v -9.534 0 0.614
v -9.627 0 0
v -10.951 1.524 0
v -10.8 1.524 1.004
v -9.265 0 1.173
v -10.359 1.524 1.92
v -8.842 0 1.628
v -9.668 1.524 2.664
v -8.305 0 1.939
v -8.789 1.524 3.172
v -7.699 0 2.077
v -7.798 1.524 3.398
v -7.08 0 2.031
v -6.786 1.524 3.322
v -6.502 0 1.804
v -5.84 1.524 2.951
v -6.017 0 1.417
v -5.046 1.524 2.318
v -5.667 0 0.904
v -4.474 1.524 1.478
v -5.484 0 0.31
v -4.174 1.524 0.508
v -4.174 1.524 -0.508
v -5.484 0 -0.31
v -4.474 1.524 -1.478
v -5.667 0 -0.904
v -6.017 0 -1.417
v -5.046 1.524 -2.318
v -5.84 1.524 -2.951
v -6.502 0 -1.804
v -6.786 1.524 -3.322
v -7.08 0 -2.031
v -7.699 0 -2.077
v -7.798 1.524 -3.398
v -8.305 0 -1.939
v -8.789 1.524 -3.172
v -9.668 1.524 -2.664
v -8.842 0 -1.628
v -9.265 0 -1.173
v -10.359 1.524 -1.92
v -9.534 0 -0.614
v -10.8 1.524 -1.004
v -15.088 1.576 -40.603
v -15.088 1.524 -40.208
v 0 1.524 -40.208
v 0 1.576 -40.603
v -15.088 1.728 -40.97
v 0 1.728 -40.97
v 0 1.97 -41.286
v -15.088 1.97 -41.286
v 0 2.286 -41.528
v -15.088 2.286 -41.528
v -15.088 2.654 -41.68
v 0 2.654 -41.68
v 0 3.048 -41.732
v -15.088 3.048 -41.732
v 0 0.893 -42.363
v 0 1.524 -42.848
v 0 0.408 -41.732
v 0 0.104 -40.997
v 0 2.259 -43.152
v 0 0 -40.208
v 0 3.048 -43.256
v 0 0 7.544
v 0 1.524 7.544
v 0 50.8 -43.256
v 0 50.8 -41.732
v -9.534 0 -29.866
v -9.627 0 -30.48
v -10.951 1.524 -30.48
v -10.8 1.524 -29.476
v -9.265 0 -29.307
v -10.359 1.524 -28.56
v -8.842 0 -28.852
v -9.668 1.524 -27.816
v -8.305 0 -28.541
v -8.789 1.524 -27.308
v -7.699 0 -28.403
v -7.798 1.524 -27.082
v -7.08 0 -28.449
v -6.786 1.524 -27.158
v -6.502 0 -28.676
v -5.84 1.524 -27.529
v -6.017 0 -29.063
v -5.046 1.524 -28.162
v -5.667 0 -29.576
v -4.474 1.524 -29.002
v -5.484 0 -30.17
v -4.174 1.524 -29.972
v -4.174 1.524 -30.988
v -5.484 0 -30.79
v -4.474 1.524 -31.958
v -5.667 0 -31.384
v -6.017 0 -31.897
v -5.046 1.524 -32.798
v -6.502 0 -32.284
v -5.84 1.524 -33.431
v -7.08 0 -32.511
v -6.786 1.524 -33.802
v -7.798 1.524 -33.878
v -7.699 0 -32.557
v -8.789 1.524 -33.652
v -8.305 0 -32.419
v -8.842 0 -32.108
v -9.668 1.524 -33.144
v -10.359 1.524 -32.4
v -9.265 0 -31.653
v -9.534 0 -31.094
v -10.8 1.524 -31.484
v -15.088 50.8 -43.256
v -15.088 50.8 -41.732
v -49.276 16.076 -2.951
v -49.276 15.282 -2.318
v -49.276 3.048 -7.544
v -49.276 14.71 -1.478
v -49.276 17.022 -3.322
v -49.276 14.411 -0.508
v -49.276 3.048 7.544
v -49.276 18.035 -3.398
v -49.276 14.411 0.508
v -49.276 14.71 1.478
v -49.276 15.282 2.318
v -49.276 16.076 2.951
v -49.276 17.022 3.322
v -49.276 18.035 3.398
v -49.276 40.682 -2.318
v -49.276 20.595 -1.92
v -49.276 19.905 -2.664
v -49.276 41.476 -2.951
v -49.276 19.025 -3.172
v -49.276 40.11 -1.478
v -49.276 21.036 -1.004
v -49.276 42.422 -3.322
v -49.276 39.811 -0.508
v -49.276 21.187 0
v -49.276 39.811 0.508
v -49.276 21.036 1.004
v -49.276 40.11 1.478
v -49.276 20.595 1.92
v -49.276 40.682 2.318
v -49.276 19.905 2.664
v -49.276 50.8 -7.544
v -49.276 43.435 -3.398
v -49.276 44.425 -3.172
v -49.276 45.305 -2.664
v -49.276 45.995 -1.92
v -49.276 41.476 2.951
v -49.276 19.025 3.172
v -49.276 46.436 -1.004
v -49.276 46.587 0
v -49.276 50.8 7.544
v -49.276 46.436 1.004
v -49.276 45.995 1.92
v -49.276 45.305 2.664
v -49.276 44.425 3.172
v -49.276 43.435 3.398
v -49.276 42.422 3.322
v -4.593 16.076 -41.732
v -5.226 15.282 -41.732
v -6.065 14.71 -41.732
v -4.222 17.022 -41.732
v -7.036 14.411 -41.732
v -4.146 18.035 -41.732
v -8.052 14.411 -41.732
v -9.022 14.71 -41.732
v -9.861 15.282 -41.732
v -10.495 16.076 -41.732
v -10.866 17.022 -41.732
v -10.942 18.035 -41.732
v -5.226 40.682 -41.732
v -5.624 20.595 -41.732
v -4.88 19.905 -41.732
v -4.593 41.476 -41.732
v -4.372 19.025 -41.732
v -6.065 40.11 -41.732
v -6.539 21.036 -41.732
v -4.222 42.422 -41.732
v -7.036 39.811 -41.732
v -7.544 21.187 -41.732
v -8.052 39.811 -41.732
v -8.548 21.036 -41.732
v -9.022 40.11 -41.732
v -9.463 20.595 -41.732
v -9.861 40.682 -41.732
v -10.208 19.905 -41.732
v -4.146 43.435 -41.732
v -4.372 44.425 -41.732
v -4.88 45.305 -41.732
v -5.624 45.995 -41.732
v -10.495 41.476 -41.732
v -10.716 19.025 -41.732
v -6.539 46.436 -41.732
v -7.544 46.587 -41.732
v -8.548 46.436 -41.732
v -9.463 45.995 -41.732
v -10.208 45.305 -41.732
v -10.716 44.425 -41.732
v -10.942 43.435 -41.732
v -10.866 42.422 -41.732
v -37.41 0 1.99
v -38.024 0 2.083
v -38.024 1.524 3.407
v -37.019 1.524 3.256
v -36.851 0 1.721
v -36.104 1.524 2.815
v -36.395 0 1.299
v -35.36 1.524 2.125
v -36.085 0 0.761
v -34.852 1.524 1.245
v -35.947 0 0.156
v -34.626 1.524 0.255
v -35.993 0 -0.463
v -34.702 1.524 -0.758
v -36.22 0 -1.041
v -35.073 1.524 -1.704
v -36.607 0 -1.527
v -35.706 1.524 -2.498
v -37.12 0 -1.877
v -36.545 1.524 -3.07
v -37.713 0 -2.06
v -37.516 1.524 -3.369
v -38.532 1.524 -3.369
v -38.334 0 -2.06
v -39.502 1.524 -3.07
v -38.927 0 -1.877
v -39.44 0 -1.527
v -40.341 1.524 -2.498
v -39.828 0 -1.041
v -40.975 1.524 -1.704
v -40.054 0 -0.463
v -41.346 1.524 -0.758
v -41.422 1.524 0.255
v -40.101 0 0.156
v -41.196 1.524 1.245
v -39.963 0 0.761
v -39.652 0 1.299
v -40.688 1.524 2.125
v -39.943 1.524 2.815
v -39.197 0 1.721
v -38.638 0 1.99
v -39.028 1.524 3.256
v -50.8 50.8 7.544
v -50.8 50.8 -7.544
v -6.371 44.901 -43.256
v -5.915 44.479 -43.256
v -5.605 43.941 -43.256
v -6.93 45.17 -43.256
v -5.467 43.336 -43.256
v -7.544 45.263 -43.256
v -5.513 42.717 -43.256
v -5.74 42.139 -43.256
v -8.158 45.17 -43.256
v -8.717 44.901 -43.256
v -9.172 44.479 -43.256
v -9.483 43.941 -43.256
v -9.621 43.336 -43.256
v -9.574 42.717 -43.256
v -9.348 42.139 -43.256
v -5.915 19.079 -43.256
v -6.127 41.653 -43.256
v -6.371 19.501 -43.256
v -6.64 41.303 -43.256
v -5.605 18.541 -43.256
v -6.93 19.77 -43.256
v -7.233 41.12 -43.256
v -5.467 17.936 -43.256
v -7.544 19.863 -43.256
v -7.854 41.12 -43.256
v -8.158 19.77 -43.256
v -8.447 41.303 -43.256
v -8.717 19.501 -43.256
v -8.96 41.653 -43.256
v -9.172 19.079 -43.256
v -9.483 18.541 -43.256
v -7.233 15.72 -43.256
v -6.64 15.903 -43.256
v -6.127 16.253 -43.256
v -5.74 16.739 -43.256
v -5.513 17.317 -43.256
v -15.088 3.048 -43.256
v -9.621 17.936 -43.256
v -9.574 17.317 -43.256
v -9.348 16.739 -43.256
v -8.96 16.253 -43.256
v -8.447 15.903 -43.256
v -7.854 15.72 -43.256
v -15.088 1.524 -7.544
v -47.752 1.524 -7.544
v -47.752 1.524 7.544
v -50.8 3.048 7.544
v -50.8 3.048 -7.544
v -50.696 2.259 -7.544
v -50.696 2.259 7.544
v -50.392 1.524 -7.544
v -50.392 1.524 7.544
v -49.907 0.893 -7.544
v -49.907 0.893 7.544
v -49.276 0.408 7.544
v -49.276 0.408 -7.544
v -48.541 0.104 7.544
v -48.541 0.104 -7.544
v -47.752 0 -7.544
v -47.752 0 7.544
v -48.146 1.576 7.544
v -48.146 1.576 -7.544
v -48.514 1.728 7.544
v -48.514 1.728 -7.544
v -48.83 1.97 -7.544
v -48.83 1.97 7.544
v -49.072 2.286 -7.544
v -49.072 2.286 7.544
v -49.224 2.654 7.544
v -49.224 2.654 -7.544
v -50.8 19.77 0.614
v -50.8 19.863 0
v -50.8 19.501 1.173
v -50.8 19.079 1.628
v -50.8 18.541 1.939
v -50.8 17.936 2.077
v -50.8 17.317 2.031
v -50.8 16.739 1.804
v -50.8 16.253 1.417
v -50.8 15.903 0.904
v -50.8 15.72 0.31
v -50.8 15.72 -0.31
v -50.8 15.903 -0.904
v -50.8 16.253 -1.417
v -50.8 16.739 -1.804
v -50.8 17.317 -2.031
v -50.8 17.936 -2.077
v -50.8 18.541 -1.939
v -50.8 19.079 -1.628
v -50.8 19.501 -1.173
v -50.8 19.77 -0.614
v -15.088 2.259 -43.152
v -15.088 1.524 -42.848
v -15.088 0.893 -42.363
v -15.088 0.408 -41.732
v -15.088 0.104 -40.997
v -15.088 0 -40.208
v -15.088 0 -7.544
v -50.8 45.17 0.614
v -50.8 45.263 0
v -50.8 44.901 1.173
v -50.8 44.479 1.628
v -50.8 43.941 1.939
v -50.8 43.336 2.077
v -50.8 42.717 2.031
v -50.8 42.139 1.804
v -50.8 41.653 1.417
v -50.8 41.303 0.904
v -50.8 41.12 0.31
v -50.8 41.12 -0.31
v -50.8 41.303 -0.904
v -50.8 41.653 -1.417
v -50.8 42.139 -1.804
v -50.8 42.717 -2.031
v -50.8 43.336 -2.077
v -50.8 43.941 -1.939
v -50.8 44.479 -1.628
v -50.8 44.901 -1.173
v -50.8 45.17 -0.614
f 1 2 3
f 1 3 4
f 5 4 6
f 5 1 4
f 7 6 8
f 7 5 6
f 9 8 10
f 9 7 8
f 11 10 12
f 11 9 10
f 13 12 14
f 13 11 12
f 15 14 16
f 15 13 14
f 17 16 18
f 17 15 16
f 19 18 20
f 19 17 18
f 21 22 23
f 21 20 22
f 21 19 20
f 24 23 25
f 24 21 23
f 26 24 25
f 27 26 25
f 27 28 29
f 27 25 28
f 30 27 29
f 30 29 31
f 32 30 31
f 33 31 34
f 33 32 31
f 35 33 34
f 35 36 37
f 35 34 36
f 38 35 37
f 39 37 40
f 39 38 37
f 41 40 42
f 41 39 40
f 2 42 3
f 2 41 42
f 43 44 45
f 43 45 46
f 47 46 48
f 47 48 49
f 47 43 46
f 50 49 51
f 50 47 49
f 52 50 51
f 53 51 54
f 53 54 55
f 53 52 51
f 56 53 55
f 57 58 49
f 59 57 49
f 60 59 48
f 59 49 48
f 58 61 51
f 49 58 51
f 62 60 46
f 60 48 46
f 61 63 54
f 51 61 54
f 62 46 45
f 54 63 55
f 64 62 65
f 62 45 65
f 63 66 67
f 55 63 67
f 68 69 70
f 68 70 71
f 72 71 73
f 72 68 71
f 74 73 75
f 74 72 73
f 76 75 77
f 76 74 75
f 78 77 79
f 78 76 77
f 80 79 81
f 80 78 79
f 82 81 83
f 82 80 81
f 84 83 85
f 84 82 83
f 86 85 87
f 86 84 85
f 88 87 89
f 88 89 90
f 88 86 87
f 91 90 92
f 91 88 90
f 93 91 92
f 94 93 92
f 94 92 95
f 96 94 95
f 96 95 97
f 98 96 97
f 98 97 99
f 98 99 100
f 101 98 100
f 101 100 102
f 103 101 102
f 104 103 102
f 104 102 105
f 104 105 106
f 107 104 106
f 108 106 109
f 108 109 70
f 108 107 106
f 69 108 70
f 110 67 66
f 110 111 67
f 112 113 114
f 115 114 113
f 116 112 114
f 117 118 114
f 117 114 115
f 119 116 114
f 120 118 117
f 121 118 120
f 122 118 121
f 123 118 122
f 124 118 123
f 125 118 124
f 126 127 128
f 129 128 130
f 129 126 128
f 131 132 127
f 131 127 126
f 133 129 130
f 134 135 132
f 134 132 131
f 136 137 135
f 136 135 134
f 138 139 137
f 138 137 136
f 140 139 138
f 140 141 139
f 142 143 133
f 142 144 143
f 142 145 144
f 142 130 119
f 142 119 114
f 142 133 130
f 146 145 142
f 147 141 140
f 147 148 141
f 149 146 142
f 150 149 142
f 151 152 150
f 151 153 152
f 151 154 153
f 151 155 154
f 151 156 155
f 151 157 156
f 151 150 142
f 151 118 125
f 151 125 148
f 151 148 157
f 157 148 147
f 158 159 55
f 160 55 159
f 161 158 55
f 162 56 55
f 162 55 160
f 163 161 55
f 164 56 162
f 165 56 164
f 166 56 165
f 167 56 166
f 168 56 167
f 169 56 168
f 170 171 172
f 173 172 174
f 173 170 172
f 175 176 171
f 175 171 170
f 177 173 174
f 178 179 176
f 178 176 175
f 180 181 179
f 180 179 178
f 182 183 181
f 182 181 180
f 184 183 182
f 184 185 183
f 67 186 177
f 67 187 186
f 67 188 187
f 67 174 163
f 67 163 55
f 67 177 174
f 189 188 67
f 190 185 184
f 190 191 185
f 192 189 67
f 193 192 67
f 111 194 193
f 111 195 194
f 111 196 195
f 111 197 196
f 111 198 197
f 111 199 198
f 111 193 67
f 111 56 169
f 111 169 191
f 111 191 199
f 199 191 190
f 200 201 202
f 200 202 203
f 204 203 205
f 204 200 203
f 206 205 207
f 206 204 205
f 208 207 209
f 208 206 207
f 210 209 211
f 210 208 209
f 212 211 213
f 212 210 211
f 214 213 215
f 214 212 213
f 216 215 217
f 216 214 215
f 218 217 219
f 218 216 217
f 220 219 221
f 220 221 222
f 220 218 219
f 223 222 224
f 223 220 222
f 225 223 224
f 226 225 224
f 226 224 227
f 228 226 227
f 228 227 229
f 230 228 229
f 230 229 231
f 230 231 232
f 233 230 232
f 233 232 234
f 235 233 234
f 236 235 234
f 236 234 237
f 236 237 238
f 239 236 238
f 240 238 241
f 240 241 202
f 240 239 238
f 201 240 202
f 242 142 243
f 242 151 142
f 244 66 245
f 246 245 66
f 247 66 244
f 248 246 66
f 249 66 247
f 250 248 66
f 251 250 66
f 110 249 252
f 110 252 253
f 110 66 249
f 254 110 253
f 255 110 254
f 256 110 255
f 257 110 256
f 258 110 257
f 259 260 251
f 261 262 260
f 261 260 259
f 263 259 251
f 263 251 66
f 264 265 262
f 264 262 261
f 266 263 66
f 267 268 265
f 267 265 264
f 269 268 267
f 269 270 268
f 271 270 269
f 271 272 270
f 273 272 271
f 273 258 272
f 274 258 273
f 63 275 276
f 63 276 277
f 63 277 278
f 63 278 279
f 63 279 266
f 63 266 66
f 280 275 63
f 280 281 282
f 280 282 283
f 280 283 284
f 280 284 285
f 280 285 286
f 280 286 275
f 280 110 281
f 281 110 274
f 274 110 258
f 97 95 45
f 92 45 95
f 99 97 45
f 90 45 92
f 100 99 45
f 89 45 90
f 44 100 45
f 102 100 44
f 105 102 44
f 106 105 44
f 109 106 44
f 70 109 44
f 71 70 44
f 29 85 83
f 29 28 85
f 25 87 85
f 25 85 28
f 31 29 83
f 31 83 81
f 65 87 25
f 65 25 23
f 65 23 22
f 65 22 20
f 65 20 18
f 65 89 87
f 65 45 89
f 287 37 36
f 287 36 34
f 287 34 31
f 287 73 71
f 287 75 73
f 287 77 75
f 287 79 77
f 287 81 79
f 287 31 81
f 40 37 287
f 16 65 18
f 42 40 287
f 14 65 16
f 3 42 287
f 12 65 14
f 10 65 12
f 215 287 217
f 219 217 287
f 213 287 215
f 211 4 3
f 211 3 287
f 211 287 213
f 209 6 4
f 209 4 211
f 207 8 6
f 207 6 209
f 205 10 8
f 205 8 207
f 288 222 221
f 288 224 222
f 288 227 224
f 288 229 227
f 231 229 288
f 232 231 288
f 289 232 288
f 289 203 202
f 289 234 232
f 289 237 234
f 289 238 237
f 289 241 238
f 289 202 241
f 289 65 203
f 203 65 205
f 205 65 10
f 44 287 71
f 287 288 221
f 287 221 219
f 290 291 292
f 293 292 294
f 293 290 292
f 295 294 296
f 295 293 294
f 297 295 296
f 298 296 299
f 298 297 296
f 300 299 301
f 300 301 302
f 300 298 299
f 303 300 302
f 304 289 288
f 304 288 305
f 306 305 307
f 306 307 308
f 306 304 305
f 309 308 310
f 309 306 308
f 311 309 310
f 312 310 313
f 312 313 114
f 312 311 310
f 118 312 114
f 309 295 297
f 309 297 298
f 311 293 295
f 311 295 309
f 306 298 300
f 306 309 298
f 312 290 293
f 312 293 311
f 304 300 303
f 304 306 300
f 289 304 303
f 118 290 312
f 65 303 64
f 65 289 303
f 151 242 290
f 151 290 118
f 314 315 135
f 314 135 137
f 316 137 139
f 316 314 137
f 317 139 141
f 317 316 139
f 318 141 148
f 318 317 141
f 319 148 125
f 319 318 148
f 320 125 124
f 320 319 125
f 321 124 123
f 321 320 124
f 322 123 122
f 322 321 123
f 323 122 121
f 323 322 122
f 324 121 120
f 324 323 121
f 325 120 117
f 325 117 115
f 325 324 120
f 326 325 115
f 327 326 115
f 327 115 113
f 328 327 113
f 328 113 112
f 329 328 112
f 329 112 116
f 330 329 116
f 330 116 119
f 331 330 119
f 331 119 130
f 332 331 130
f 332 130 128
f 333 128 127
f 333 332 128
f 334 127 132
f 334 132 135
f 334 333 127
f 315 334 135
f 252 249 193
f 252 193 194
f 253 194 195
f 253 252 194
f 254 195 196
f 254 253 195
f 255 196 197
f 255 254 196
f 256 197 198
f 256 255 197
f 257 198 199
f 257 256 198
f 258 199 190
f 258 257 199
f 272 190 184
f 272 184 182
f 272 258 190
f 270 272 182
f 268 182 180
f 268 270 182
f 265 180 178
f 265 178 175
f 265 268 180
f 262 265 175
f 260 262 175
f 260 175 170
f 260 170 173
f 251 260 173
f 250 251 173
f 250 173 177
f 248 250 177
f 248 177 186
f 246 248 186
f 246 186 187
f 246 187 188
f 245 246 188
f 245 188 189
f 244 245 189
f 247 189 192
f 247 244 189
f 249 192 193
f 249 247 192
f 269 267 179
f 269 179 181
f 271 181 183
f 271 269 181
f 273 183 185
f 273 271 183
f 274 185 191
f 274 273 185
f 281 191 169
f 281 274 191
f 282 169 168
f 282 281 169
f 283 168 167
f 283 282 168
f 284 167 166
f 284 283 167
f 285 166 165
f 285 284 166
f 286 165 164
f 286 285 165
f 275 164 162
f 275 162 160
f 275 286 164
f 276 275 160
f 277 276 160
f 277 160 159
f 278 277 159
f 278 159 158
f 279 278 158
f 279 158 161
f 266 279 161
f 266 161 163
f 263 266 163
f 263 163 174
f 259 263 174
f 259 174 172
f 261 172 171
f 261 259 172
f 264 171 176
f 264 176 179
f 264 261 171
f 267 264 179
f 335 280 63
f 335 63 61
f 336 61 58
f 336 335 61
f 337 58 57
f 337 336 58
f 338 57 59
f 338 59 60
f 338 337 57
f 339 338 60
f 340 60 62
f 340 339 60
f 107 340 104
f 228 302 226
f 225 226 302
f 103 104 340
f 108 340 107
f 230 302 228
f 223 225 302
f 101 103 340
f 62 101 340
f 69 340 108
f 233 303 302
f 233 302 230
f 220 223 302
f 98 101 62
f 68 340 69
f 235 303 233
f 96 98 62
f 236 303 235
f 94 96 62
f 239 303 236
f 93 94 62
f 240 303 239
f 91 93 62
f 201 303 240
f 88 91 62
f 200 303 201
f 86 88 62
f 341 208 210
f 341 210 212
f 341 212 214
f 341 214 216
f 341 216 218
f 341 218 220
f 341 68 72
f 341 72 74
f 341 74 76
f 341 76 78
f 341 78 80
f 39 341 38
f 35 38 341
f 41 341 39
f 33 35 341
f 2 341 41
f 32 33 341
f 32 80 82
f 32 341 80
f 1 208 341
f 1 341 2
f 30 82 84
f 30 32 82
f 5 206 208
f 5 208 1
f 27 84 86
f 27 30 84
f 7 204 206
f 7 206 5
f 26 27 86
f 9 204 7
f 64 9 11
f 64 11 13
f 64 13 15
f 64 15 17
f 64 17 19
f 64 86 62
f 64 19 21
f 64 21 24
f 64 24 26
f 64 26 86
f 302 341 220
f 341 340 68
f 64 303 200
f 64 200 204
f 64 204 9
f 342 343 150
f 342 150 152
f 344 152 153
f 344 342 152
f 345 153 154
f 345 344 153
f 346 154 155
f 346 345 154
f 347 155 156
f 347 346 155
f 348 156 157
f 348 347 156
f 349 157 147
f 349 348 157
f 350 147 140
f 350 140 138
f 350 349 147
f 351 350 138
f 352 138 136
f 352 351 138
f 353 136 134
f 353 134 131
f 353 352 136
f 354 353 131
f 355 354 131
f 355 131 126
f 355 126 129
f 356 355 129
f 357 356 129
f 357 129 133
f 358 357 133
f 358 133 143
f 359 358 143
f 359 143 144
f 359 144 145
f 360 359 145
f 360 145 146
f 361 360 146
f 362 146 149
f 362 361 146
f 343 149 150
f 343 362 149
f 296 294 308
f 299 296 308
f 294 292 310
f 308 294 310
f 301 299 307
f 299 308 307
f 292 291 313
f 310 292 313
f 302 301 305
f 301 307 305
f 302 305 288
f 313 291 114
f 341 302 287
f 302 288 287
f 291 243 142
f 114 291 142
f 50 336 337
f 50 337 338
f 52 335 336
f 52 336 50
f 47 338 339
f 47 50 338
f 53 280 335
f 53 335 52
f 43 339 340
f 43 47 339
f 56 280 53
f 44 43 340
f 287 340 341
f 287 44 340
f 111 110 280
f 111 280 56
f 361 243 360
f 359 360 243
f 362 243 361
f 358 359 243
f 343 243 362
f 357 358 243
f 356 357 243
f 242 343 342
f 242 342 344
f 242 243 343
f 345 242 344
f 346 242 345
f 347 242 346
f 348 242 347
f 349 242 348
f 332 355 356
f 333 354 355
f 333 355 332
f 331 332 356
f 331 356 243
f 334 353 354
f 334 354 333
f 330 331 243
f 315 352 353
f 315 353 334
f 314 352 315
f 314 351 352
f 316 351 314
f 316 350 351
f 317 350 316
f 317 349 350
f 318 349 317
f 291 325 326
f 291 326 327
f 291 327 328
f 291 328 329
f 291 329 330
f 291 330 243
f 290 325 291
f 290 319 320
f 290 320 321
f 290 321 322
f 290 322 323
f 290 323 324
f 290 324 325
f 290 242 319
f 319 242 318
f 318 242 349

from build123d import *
from OCP.BRepFilletAPI import BRepFilletAPI_MakeChamfer

# Parameters (mm, degrees)
EXTRUDE_THIN1_DEPTH = 7.5438
SKETCH4_R           = 2.0828
CUT_EXTRUDE1_DEPTH  = 72.173542096
SKETCH5_R           = 2.0828
CUT_EXTRUDE2_DEPTH  = 72.173542096
CHAMFER1_SIZE       = 1.324792988
CHAMFER1_SIZE_2     = 1.524
CIRPATTERN1_COUNT   = 2
CIRPATTERN1_ANGLE   = 90


with BuildPart() as part:
    # Sketch1 → Extrude-Thin1 (new, symmetric)
    with BuildSketch(Plane.XY):
        with BuildLine():
            Line((-50.8, 50.8), (-50.8, 3.048))
            ThreePointArc((-50.8, 3.048), (-49.907261469, 0.892738531), (-47.752, 0))
            Line((-47.752, 0), (0, 0))
            Line((0, 0), (0, 1.524))
            Line((0, 1.524), (-47.752, 1.524))
            ThreePointArc((-47.752, 1.524), (-48.829630735, 1.970369265), (-49.276, 3.048))
            Line((-49.276, 3.048), (-49.276, 50.8))
            Line((-49.276, 50.8), (-50.8, 50.8))
        make_face()
    extrude(amount=EXTRUDE_THIN1_DEPTH, both=True)

    # Sketch4 → Cut-Extrude1 (cut, through all)
    with BuildSketch(Plane(origin=(0, 1.524, 0), x_dir=(1, 0, 0), z_dir=(0, 1, 0))):
        with Locations(Location((-7.5438, 0, 0), (0, 0, 270))):
            Circle(SKETCH4_R)
        with Locations(Location((-38.0238, 0, 0), (0, 0, 270))):
            Circle(SKETCH4_R)
    extrude(amount=-CUT_EXTRUDE1_DEPTH, mode=Mode.SUBTRACT)

    # Sketch5 → Cut-Extrude2 (cut, through all)
    with BuildSketch(Plane(origin=(-49.276, 0, 0), x_dir=(0, 0, -1), z_dir=(1, 0, 0))):
        with Locations(Location((0, 43.18, 0), (0, 0, 90))):
            Circle(SKETCH5_R)
        with Locations(Location((0, 17.78, 0), (0, 0, 90))):
            Circle(SKETCH5_R)
    extrude(amount=-CUT_EXTRUDE2_DEPTH, mode=Mode.SUBTRACT)

    # Chamfer1
    chamfer1_edges_1 = [part.edges().sort_by_distance(p)[0] for p in [
        (-7.5438, 1.524, -2.0828),
    ]]
    chamfer1_side_1 = [part.faces().sort_by_distance(p)[0] for p in [
        (-7.5438, 1.524, -2.10929586),
    ]]
    chamfer1_edges_2 = [part.edges().sort_by_distance(p)[0] for p in [
        (-38.0238, 1.524, -2.0828),
    ]]
    chamfer1_side_2 = [part.faces().sort_by_distance(p)[0] for p in [
        (-38.0238, 1.524, -2.10929586),
    ]]
    chamfer1_edges_3 = [part.edges().sort_by_distance(p)[0] for p in [
        (-49.276, 41.0972, 0),
    ]]
    chamfer1_side_3 = [part.faces().sort_by_distance(p)[0] for p in [
        (-49.276, 41.07070414, 0),
    ]]
    chamfer1_edges_4 = [part.edges().sort_by_distance(p)[0] for p in [
        (-49.276, 15.6972, 0),
    ]]
    chamfer1_side_4 = [part.faces().sort_by_distance(p)[0] for p in [
        (-49.276, 15.67070414, 0),
    ]]
    chamfer1 = BRepFilletAPI_MakeChamfer(part.part.solid().wrapped)
    for e in chamfer1_edges_1:
        chamfer1.Add(CHAMFER1_SIZE - 0.0001, CHAMFER1_SIZE_2 - 0.0001, e.wrapped, chamfer1_side_1[0].wrapped)
    for e in chamfer1_edges_2:
        chamfer1.Add(CHAMFER1_SIZE - 0.0001, CHAMFER1_SIZE_2 - 0.0001, e.wrapped, chamfer1_side_2[0].wrapped)
    for e in chamfer1_edges_3:
        chamfer1.Add(CHAMFER1_SIZE - 0.0001, CHAMFER1_SIZE_2 - 0.0001, e.wrapped, chamfer1_side_3[0].wrapped)
    for e in chamfer1_edges_4:
        chamfer1.Add(CHAMFER1_SIZE - 0.0001, CHAMFER1_SIZE_2 - 0.0001, e.wrapped, chamfer1_side_4[0].wrapped)
    add(Compound.cast(chamfer1.Shape()), mode=Mode.REPLACE)  # a hair under: the kernel refuses the full size


with BuildPart() as cirpattern1_1:
    # CirPattern1: pattern copy
    add(part.part.rotate(Axis((-7.5438, 0, 0), (0, -1, 0)), 1 * CIRPATTERN1_ANGLE / (CIRPATTERN1_COUNT - 1)))

    # Combine1: union part
    add(part.part)


solid = cirpattern1_1.part
